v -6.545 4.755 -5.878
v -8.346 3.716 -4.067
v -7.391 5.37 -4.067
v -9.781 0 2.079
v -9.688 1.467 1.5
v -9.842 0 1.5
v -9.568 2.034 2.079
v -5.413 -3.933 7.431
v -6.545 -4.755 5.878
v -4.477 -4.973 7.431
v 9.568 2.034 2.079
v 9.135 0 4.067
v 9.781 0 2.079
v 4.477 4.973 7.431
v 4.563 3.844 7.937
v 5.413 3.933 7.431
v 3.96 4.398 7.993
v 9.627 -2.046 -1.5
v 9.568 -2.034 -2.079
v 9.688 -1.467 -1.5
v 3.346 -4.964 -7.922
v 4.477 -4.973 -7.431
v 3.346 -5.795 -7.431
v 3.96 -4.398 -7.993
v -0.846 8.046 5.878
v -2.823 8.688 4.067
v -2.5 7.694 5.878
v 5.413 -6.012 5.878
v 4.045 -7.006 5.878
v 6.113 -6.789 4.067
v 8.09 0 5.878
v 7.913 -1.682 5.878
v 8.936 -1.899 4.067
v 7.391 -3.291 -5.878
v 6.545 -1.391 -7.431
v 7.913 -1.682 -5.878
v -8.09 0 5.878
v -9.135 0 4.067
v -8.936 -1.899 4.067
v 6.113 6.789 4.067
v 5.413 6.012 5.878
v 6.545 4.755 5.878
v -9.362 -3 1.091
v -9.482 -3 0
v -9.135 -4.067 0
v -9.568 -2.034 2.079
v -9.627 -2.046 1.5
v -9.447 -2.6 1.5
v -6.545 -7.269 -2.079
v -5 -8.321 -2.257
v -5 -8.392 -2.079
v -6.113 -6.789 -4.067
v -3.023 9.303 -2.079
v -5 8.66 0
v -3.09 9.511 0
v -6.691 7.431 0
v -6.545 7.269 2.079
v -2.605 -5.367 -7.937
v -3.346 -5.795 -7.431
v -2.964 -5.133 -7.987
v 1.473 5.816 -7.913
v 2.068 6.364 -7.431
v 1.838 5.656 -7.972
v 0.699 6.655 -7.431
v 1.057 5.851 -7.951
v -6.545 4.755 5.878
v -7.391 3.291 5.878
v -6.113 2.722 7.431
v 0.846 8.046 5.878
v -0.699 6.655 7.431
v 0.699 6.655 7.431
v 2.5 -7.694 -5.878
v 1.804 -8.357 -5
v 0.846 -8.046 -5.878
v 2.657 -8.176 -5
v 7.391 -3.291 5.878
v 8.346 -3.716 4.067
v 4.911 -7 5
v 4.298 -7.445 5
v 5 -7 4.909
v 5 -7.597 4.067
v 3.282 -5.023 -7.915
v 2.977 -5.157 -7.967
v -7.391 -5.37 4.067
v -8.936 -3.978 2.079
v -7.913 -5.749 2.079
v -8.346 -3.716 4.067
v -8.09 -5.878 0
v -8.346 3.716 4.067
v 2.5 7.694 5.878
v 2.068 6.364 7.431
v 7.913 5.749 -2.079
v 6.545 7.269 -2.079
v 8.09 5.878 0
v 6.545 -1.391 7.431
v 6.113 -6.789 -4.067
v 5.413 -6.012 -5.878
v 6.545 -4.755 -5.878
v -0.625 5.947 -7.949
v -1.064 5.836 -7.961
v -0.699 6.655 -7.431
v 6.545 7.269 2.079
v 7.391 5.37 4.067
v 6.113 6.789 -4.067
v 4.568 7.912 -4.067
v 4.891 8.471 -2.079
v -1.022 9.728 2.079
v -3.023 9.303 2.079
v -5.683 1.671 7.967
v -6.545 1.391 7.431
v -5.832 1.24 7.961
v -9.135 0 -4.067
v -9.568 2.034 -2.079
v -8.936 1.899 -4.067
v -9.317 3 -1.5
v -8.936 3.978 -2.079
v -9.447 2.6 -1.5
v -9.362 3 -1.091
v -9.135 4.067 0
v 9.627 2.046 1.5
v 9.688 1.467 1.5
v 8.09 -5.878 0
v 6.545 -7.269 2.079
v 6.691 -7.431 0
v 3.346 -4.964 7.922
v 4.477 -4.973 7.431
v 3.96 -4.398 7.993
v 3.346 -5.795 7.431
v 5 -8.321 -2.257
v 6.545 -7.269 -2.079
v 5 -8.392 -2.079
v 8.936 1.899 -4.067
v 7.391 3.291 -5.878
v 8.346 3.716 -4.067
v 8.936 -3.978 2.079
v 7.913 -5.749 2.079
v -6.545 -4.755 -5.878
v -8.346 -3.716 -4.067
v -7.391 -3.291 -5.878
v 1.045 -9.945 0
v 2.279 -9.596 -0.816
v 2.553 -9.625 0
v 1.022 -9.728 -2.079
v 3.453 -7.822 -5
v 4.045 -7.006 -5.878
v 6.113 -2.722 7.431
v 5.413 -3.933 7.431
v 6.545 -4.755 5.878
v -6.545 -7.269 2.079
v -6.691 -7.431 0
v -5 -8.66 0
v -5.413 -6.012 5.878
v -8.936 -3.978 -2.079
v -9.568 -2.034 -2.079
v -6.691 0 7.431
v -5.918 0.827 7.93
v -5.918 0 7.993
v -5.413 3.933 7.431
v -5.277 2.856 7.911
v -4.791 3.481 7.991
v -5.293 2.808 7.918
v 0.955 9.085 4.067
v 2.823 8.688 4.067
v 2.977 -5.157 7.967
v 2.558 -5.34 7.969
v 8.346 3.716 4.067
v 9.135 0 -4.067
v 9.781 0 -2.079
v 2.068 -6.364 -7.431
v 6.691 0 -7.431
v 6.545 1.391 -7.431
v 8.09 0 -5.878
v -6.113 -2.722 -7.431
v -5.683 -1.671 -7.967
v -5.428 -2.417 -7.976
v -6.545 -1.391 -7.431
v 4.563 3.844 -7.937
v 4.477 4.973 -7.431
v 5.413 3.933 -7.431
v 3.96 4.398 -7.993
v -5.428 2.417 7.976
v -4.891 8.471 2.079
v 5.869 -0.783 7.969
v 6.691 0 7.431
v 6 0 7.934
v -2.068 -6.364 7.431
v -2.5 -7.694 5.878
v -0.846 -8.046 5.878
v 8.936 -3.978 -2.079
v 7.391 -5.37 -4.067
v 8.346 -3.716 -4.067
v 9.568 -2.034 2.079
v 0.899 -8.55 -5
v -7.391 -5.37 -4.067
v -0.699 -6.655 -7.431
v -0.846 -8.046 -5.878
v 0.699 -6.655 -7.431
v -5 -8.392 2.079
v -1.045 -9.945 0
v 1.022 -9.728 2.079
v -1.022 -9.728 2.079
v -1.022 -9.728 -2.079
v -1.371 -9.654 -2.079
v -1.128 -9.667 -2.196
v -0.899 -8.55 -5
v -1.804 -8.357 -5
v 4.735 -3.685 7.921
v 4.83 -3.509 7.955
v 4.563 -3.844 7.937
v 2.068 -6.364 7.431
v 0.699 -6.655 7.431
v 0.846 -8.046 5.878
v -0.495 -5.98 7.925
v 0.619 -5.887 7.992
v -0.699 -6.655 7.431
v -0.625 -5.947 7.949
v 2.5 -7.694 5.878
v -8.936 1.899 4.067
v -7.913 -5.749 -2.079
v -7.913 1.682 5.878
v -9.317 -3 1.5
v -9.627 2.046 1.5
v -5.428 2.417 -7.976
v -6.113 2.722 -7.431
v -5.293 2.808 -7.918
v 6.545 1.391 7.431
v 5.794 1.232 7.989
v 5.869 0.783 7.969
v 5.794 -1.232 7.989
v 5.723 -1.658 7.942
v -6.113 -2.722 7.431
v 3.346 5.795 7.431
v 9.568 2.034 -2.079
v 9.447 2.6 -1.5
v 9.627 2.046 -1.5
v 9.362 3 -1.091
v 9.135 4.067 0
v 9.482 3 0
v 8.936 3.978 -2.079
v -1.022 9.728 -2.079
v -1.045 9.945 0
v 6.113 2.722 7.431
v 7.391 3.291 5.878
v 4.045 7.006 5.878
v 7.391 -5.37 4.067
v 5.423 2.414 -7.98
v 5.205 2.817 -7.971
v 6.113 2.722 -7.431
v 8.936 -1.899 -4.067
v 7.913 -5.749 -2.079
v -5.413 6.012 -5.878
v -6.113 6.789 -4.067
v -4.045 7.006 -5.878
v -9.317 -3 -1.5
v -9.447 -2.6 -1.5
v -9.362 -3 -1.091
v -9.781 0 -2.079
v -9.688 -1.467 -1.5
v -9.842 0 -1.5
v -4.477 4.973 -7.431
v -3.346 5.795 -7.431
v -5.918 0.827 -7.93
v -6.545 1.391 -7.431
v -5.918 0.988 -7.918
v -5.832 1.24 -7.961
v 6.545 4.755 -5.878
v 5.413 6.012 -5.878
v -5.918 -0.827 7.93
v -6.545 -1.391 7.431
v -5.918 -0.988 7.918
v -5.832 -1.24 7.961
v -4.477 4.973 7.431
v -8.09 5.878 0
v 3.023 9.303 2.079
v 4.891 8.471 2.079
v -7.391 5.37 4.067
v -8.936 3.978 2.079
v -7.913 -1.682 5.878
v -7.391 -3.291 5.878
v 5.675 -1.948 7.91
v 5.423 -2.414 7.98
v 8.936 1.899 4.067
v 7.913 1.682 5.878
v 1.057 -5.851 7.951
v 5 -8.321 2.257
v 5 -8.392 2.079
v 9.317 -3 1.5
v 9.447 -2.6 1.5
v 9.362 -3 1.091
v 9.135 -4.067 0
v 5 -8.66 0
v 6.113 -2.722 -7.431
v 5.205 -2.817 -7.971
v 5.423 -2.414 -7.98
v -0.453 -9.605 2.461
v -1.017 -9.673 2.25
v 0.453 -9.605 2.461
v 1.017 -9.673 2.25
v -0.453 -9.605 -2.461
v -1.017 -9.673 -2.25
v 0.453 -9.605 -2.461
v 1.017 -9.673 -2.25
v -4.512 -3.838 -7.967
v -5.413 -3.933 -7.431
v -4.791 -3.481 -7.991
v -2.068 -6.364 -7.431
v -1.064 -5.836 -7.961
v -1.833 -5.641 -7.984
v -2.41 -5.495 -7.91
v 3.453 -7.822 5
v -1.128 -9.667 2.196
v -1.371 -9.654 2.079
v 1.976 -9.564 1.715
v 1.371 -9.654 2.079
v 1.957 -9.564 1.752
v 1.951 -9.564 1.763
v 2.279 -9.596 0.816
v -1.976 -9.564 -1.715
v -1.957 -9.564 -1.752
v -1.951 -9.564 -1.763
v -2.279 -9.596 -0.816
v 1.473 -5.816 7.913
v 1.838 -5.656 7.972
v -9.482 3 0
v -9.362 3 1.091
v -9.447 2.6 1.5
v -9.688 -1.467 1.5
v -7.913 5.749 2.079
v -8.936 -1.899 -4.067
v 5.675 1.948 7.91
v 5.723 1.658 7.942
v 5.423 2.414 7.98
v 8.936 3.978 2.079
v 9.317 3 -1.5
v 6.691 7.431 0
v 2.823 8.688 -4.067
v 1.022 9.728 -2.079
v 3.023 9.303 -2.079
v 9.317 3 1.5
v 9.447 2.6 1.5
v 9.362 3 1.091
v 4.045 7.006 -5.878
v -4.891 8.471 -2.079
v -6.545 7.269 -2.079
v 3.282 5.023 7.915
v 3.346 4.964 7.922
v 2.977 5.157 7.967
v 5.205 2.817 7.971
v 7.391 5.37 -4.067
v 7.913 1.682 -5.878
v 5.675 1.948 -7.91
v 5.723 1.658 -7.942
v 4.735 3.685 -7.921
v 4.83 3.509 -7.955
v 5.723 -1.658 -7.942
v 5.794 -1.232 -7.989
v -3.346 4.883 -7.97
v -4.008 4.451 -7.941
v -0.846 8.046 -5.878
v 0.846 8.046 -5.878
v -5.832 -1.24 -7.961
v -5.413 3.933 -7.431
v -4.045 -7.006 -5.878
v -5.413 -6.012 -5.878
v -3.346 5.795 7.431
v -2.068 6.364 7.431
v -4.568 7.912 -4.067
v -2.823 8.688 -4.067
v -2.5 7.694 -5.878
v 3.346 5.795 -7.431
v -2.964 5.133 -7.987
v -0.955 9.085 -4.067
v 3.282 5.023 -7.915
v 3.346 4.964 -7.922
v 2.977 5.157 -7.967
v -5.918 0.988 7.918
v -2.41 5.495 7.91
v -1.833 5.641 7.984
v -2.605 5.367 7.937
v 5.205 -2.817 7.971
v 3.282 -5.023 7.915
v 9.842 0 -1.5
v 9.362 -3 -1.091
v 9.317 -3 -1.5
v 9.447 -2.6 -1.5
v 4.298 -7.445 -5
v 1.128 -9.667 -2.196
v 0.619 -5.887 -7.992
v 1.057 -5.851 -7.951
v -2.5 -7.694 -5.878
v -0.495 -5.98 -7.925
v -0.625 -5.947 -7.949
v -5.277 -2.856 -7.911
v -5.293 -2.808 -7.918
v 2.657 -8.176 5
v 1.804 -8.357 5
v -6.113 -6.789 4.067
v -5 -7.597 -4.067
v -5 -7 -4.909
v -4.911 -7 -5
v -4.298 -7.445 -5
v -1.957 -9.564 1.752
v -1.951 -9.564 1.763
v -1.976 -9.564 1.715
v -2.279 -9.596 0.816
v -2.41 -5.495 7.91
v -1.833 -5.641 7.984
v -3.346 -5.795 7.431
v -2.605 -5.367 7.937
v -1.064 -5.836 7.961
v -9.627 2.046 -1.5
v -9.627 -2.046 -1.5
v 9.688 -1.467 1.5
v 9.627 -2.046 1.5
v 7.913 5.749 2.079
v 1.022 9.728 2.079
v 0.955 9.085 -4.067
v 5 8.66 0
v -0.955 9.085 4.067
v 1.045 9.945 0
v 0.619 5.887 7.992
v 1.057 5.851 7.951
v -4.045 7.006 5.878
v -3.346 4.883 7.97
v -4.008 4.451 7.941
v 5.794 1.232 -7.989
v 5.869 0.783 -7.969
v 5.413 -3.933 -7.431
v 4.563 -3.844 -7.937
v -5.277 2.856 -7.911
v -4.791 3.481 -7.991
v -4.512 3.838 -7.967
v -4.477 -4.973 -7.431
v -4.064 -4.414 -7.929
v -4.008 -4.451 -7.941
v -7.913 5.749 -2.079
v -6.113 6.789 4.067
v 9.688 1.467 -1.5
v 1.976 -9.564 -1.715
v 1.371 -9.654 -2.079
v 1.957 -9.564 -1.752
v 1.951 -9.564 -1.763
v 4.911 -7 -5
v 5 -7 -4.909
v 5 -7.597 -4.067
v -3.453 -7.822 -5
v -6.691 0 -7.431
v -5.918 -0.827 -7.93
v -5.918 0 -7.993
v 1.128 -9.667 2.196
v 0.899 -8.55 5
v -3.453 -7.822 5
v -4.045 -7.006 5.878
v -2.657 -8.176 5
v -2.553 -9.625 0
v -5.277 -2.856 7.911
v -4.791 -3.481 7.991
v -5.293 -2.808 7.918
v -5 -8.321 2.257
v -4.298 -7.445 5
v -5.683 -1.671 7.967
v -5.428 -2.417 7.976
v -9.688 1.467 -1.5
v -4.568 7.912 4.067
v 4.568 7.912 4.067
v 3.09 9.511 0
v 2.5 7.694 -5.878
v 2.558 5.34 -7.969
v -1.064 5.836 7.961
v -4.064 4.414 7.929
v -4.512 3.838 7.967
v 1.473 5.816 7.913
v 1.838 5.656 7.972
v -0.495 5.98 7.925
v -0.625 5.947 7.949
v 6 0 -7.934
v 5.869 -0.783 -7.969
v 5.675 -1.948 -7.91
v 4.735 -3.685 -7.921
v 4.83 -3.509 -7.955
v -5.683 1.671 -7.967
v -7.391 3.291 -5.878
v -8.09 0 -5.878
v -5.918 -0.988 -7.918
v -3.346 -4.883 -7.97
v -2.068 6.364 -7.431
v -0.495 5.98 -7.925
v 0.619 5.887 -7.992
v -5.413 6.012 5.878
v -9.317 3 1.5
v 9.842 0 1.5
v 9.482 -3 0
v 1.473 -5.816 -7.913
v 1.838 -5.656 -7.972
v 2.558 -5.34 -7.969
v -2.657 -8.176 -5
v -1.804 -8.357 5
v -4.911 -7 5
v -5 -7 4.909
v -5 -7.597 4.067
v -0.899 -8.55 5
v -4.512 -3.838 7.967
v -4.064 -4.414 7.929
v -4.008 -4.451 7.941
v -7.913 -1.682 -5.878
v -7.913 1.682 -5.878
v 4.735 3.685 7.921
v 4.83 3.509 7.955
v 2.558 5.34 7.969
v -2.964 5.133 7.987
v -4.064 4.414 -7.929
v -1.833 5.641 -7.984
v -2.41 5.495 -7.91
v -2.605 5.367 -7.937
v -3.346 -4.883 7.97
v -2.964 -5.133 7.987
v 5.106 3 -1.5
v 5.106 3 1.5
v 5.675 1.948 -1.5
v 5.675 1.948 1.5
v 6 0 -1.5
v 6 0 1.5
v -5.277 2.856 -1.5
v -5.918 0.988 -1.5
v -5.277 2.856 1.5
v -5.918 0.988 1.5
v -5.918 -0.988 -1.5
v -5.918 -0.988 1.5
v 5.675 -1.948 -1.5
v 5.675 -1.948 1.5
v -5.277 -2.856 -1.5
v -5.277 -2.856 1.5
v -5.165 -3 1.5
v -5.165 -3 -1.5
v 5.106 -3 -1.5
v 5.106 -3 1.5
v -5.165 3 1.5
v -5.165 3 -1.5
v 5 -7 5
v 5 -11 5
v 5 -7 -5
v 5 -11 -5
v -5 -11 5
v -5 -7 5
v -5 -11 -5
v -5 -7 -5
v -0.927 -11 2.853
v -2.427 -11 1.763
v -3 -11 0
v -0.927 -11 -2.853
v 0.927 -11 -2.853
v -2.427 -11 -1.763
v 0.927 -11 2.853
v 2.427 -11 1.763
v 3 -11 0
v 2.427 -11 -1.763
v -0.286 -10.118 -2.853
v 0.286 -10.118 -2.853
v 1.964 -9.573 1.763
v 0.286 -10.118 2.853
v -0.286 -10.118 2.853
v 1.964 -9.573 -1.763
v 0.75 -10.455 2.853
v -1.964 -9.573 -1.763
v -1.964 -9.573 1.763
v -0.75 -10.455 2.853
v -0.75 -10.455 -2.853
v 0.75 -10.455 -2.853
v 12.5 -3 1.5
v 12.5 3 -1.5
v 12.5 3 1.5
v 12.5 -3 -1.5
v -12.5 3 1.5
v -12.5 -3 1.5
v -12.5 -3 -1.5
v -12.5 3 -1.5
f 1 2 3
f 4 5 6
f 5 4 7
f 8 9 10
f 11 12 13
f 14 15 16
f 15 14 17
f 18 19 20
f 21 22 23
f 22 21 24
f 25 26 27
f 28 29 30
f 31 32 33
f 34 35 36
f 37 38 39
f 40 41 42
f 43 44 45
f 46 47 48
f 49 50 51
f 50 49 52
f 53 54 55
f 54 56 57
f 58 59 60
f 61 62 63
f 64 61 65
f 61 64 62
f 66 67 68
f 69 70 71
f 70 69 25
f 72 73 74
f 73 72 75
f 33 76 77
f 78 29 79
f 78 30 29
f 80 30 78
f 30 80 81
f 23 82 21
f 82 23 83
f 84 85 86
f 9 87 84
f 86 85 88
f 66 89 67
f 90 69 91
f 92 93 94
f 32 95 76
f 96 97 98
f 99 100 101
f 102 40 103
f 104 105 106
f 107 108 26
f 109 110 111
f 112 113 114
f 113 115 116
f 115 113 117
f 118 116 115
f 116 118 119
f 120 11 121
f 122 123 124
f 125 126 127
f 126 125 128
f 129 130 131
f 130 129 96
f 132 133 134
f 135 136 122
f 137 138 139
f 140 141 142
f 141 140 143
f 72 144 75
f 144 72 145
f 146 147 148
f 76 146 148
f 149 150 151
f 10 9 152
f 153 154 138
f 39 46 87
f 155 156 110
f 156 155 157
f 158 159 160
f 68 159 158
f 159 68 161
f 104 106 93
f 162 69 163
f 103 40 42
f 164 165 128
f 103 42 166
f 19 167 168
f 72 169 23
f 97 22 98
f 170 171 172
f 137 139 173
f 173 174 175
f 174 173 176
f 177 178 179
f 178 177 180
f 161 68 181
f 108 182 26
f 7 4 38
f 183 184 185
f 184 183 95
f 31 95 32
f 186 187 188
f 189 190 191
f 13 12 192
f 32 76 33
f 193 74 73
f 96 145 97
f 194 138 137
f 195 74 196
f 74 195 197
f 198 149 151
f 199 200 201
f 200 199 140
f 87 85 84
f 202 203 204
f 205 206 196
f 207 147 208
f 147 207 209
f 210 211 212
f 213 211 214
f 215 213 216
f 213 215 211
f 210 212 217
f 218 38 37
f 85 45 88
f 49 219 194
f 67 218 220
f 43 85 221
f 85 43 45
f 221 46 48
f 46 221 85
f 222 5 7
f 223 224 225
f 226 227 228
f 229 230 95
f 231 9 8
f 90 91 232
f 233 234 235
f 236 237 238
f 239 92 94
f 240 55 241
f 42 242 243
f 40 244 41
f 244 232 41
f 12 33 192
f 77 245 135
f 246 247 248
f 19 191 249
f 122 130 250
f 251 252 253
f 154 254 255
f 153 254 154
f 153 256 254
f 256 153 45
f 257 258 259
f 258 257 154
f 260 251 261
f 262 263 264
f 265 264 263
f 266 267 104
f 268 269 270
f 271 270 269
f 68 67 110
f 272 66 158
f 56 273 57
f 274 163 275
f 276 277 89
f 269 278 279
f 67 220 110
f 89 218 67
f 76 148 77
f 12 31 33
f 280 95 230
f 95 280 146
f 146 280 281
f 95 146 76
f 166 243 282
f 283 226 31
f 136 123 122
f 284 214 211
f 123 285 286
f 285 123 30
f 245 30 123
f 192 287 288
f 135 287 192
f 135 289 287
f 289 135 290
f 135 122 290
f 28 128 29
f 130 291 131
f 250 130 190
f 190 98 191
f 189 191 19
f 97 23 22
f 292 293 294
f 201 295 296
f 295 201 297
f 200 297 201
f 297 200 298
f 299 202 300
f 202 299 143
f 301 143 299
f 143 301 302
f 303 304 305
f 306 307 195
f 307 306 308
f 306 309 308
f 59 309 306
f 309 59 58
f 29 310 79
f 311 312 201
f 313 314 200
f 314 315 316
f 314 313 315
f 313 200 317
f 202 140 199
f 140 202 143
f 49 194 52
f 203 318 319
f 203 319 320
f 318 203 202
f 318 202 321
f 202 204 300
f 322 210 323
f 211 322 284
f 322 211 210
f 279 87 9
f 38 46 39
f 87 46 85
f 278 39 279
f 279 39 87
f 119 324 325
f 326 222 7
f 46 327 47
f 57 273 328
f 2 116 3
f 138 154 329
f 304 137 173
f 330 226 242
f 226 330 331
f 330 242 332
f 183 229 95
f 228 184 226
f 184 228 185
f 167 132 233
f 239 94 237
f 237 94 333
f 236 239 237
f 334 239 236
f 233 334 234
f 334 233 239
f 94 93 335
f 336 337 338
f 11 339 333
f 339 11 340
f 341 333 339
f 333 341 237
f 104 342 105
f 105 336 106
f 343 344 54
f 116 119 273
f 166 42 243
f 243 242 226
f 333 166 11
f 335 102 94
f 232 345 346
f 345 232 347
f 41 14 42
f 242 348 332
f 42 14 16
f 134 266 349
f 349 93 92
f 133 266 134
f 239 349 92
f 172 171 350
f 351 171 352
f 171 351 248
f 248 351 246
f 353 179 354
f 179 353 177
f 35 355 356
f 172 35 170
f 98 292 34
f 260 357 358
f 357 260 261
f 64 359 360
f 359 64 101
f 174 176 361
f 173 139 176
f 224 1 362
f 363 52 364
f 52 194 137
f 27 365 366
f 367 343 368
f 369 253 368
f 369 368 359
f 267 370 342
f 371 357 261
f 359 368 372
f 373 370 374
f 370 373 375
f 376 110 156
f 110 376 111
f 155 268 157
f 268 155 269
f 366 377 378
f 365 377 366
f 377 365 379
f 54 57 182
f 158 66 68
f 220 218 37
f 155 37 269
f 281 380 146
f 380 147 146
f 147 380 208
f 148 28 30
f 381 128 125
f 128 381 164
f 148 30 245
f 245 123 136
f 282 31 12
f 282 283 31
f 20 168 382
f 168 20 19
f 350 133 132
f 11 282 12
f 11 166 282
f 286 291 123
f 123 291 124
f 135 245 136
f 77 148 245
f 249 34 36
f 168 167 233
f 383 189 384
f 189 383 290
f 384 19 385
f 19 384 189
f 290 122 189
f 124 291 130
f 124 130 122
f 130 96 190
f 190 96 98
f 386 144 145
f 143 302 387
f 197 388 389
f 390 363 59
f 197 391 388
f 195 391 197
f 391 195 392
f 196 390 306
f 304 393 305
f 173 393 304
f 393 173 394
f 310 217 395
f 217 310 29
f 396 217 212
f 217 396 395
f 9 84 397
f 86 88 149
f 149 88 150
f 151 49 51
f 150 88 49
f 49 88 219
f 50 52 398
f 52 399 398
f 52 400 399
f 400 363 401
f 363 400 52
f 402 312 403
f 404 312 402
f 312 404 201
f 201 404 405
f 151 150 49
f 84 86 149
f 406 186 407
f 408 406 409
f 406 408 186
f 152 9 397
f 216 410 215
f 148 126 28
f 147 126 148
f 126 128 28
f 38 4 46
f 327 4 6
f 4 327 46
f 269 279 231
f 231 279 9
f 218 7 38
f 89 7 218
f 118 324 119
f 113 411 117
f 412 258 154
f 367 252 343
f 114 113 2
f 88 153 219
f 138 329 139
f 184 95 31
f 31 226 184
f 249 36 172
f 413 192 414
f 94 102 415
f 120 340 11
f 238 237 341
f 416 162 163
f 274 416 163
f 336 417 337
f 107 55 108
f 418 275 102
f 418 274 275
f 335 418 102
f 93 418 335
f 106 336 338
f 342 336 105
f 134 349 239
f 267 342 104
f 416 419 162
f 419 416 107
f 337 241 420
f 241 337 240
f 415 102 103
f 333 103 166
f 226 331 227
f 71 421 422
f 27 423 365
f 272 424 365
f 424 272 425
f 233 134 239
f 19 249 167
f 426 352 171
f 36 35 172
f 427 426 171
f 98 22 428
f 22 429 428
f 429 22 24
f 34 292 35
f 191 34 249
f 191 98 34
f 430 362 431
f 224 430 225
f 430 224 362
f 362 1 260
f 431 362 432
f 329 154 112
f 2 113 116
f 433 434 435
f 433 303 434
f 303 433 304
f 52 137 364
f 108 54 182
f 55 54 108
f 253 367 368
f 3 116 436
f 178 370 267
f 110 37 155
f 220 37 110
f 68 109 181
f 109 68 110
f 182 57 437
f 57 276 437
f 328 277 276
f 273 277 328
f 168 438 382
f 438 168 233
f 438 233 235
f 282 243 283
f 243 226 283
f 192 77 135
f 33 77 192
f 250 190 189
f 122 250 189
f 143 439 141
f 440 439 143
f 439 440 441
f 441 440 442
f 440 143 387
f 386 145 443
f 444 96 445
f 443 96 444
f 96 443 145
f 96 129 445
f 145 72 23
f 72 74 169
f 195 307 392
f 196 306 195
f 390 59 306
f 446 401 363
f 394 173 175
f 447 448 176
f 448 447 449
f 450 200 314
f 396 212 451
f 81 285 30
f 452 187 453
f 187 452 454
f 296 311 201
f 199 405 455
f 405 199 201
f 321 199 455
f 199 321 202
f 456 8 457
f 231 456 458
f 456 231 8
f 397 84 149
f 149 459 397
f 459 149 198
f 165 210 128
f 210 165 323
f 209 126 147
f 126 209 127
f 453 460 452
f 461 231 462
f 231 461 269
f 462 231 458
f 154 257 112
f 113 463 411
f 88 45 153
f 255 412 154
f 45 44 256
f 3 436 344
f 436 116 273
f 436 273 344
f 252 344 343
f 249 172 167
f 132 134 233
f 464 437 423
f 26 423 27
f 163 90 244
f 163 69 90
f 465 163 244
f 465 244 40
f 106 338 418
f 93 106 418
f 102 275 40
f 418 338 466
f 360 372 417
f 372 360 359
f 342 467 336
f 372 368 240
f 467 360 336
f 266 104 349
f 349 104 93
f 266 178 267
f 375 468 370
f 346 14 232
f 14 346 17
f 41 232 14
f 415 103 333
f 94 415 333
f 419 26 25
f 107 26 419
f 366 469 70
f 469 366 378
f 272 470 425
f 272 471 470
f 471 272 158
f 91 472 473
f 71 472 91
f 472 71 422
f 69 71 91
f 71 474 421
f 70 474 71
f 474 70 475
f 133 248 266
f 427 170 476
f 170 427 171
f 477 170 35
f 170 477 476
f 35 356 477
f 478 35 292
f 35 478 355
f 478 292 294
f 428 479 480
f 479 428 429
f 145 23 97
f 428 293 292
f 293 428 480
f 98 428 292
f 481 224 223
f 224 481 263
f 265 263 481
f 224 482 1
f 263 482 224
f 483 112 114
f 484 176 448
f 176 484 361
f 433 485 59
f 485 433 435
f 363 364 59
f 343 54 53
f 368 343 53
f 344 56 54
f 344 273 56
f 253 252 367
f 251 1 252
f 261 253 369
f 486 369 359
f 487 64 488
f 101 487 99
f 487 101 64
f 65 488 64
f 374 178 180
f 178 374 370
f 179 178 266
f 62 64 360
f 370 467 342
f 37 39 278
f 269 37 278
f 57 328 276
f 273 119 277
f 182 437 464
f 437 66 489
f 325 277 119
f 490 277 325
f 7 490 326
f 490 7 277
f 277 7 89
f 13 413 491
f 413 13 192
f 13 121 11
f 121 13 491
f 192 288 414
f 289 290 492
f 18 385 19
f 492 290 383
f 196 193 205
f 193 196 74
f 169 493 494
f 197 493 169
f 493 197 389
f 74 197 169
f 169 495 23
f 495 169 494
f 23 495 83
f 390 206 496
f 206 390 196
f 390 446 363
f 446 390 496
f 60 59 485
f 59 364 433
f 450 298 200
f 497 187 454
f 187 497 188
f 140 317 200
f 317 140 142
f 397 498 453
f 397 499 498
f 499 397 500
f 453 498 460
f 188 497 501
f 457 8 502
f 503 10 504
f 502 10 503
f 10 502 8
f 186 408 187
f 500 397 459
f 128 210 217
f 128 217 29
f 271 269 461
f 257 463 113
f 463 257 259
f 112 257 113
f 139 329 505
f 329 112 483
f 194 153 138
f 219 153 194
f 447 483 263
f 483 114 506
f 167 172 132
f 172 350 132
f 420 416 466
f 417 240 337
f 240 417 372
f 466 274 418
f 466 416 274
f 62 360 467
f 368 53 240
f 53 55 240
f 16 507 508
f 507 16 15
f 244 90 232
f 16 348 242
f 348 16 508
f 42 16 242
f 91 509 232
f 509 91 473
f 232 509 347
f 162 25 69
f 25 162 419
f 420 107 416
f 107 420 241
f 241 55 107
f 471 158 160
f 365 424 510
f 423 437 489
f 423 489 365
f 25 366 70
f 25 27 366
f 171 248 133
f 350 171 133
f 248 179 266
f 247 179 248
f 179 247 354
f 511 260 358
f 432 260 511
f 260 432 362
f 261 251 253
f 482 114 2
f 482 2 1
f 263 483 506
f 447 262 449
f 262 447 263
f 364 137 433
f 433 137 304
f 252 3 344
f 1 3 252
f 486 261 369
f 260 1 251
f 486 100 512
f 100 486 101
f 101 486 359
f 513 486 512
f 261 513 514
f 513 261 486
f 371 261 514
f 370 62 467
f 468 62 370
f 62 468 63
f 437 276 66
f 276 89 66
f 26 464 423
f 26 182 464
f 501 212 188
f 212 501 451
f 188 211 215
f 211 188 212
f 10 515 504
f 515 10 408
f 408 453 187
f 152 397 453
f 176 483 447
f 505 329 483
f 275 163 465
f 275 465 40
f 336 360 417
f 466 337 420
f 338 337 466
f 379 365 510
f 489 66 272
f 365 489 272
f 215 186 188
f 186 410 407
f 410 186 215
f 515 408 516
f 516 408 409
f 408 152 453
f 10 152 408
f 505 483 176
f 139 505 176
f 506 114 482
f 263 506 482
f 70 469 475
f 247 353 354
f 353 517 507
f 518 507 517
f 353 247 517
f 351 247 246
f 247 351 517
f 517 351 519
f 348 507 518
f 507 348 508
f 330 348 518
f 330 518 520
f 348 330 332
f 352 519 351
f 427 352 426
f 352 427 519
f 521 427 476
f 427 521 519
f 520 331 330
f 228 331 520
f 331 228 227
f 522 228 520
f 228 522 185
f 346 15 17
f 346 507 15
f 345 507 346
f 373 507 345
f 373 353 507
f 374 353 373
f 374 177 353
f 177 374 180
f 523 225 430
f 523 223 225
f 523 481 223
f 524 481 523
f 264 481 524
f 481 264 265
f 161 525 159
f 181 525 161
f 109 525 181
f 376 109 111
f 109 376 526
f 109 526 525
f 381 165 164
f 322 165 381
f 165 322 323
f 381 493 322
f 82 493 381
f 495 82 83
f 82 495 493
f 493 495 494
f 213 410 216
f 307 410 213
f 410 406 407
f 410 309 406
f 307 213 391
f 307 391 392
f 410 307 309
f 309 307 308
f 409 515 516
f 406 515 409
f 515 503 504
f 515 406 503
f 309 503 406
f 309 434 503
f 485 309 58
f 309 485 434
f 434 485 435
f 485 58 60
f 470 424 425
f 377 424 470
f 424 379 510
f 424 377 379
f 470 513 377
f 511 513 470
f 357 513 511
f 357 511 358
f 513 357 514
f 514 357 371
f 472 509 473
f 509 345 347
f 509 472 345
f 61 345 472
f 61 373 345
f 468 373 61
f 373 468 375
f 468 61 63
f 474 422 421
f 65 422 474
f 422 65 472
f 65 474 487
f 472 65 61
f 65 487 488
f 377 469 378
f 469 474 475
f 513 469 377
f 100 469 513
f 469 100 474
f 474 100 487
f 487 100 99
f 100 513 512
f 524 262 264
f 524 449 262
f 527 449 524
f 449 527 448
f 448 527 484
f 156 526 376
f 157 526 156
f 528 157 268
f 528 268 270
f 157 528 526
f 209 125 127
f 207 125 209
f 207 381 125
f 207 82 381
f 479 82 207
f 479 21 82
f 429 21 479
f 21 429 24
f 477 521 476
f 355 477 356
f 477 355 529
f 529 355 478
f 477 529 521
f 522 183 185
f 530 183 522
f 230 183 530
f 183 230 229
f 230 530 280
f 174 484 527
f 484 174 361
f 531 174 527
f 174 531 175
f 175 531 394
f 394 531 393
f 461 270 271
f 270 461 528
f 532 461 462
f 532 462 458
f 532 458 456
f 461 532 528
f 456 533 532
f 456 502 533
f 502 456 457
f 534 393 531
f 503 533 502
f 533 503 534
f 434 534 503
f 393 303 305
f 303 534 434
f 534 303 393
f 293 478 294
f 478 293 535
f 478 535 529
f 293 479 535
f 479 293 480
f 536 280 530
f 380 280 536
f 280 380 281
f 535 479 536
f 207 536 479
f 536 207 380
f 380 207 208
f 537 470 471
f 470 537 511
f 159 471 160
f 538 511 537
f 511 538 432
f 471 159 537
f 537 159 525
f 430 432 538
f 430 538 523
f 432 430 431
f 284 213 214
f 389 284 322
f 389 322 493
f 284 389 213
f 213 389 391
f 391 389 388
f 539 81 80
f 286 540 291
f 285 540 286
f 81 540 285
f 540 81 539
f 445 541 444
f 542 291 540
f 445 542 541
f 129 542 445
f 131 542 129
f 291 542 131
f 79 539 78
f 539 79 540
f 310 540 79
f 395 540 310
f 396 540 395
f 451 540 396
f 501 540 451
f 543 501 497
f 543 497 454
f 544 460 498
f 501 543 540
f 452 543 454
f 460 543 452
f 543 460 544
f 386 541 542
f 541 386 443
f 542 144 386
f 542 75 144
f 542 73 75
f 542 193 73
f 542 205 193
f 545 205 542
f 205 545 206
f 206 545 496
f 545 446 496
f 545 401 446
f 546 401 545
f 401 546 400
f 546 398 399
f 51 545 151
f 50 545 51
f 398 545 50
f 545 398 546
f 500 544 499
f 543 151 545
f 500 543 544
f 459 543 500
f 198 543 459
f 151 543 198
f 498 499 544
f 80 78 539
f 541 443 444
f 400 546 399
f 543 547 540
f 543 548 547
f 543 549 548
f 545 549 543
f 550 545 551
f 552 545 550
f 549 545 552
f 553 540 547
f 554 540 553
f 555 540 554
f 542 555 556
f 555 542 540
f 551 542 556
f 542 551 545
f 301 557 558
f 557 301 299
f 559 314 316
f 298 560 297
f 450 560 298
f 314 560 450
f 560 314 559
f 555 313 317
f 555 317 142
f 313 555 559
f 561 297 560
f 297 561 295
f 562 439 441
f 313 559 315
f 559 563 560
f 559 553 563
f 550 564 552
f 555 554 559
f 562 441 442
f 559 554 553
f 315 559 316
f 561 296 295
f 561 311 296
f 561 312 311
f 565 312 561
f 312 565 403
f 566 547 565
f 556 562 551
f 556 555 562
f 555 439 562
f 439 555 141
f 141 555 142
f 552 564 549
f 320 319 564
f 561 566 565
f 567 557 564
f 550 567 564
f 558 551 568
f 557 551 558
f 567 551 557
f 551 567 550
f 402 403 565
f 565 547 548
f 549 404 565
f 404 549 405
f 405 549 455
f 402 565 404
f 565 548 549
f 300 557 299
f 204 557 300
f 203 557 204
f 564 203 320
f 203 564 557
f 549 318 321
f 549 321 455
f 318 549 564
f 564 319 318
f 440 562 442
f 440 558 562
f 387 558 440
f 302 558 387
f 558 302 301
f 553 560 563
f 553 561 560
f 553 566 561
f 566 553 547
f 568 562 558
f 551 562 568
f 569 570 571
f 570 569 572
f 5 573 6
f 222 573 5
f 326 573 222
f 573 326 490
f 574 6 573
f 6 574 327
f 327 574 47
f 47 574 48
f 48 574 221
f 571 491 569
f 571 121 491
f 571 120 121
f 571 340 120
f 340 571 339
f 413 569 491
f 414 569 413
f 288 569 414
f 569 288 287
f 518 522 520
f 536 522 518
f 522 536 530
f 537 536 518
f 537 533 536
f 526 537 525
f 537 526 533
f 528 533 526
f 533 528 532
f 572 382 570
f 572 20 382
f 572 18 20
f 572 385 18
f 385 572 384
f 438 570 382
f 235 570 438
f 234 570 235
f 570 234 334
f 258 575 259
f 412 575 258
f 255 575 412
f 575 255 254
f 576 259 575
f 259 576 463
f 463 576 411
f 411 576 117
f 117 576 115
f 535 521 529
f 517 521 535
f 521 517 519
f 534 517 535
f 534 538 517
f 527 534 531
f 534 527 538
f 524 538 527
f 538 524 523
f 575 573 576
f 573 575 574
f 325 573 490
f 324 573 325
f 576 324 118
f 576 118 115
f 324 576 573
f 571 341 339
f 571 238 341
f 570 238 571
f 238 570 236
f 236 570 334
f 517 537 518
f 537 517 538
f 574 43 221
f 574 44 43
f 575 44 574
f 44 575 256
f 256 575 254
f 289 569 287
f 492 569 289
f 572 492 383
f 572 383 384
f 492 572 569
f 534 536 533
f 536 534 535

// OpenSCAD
difference() {
  sphere(r=10);
  #cylinder(h=30, r=6, center=true);
}
#if (true) cube([25,6,3], center=true);

#translate([0,-9,0]) difference() {
  color("green") cube([10,4,10], center=true);
  color("red") translate([0,-2,0]) sphere(3);
}
